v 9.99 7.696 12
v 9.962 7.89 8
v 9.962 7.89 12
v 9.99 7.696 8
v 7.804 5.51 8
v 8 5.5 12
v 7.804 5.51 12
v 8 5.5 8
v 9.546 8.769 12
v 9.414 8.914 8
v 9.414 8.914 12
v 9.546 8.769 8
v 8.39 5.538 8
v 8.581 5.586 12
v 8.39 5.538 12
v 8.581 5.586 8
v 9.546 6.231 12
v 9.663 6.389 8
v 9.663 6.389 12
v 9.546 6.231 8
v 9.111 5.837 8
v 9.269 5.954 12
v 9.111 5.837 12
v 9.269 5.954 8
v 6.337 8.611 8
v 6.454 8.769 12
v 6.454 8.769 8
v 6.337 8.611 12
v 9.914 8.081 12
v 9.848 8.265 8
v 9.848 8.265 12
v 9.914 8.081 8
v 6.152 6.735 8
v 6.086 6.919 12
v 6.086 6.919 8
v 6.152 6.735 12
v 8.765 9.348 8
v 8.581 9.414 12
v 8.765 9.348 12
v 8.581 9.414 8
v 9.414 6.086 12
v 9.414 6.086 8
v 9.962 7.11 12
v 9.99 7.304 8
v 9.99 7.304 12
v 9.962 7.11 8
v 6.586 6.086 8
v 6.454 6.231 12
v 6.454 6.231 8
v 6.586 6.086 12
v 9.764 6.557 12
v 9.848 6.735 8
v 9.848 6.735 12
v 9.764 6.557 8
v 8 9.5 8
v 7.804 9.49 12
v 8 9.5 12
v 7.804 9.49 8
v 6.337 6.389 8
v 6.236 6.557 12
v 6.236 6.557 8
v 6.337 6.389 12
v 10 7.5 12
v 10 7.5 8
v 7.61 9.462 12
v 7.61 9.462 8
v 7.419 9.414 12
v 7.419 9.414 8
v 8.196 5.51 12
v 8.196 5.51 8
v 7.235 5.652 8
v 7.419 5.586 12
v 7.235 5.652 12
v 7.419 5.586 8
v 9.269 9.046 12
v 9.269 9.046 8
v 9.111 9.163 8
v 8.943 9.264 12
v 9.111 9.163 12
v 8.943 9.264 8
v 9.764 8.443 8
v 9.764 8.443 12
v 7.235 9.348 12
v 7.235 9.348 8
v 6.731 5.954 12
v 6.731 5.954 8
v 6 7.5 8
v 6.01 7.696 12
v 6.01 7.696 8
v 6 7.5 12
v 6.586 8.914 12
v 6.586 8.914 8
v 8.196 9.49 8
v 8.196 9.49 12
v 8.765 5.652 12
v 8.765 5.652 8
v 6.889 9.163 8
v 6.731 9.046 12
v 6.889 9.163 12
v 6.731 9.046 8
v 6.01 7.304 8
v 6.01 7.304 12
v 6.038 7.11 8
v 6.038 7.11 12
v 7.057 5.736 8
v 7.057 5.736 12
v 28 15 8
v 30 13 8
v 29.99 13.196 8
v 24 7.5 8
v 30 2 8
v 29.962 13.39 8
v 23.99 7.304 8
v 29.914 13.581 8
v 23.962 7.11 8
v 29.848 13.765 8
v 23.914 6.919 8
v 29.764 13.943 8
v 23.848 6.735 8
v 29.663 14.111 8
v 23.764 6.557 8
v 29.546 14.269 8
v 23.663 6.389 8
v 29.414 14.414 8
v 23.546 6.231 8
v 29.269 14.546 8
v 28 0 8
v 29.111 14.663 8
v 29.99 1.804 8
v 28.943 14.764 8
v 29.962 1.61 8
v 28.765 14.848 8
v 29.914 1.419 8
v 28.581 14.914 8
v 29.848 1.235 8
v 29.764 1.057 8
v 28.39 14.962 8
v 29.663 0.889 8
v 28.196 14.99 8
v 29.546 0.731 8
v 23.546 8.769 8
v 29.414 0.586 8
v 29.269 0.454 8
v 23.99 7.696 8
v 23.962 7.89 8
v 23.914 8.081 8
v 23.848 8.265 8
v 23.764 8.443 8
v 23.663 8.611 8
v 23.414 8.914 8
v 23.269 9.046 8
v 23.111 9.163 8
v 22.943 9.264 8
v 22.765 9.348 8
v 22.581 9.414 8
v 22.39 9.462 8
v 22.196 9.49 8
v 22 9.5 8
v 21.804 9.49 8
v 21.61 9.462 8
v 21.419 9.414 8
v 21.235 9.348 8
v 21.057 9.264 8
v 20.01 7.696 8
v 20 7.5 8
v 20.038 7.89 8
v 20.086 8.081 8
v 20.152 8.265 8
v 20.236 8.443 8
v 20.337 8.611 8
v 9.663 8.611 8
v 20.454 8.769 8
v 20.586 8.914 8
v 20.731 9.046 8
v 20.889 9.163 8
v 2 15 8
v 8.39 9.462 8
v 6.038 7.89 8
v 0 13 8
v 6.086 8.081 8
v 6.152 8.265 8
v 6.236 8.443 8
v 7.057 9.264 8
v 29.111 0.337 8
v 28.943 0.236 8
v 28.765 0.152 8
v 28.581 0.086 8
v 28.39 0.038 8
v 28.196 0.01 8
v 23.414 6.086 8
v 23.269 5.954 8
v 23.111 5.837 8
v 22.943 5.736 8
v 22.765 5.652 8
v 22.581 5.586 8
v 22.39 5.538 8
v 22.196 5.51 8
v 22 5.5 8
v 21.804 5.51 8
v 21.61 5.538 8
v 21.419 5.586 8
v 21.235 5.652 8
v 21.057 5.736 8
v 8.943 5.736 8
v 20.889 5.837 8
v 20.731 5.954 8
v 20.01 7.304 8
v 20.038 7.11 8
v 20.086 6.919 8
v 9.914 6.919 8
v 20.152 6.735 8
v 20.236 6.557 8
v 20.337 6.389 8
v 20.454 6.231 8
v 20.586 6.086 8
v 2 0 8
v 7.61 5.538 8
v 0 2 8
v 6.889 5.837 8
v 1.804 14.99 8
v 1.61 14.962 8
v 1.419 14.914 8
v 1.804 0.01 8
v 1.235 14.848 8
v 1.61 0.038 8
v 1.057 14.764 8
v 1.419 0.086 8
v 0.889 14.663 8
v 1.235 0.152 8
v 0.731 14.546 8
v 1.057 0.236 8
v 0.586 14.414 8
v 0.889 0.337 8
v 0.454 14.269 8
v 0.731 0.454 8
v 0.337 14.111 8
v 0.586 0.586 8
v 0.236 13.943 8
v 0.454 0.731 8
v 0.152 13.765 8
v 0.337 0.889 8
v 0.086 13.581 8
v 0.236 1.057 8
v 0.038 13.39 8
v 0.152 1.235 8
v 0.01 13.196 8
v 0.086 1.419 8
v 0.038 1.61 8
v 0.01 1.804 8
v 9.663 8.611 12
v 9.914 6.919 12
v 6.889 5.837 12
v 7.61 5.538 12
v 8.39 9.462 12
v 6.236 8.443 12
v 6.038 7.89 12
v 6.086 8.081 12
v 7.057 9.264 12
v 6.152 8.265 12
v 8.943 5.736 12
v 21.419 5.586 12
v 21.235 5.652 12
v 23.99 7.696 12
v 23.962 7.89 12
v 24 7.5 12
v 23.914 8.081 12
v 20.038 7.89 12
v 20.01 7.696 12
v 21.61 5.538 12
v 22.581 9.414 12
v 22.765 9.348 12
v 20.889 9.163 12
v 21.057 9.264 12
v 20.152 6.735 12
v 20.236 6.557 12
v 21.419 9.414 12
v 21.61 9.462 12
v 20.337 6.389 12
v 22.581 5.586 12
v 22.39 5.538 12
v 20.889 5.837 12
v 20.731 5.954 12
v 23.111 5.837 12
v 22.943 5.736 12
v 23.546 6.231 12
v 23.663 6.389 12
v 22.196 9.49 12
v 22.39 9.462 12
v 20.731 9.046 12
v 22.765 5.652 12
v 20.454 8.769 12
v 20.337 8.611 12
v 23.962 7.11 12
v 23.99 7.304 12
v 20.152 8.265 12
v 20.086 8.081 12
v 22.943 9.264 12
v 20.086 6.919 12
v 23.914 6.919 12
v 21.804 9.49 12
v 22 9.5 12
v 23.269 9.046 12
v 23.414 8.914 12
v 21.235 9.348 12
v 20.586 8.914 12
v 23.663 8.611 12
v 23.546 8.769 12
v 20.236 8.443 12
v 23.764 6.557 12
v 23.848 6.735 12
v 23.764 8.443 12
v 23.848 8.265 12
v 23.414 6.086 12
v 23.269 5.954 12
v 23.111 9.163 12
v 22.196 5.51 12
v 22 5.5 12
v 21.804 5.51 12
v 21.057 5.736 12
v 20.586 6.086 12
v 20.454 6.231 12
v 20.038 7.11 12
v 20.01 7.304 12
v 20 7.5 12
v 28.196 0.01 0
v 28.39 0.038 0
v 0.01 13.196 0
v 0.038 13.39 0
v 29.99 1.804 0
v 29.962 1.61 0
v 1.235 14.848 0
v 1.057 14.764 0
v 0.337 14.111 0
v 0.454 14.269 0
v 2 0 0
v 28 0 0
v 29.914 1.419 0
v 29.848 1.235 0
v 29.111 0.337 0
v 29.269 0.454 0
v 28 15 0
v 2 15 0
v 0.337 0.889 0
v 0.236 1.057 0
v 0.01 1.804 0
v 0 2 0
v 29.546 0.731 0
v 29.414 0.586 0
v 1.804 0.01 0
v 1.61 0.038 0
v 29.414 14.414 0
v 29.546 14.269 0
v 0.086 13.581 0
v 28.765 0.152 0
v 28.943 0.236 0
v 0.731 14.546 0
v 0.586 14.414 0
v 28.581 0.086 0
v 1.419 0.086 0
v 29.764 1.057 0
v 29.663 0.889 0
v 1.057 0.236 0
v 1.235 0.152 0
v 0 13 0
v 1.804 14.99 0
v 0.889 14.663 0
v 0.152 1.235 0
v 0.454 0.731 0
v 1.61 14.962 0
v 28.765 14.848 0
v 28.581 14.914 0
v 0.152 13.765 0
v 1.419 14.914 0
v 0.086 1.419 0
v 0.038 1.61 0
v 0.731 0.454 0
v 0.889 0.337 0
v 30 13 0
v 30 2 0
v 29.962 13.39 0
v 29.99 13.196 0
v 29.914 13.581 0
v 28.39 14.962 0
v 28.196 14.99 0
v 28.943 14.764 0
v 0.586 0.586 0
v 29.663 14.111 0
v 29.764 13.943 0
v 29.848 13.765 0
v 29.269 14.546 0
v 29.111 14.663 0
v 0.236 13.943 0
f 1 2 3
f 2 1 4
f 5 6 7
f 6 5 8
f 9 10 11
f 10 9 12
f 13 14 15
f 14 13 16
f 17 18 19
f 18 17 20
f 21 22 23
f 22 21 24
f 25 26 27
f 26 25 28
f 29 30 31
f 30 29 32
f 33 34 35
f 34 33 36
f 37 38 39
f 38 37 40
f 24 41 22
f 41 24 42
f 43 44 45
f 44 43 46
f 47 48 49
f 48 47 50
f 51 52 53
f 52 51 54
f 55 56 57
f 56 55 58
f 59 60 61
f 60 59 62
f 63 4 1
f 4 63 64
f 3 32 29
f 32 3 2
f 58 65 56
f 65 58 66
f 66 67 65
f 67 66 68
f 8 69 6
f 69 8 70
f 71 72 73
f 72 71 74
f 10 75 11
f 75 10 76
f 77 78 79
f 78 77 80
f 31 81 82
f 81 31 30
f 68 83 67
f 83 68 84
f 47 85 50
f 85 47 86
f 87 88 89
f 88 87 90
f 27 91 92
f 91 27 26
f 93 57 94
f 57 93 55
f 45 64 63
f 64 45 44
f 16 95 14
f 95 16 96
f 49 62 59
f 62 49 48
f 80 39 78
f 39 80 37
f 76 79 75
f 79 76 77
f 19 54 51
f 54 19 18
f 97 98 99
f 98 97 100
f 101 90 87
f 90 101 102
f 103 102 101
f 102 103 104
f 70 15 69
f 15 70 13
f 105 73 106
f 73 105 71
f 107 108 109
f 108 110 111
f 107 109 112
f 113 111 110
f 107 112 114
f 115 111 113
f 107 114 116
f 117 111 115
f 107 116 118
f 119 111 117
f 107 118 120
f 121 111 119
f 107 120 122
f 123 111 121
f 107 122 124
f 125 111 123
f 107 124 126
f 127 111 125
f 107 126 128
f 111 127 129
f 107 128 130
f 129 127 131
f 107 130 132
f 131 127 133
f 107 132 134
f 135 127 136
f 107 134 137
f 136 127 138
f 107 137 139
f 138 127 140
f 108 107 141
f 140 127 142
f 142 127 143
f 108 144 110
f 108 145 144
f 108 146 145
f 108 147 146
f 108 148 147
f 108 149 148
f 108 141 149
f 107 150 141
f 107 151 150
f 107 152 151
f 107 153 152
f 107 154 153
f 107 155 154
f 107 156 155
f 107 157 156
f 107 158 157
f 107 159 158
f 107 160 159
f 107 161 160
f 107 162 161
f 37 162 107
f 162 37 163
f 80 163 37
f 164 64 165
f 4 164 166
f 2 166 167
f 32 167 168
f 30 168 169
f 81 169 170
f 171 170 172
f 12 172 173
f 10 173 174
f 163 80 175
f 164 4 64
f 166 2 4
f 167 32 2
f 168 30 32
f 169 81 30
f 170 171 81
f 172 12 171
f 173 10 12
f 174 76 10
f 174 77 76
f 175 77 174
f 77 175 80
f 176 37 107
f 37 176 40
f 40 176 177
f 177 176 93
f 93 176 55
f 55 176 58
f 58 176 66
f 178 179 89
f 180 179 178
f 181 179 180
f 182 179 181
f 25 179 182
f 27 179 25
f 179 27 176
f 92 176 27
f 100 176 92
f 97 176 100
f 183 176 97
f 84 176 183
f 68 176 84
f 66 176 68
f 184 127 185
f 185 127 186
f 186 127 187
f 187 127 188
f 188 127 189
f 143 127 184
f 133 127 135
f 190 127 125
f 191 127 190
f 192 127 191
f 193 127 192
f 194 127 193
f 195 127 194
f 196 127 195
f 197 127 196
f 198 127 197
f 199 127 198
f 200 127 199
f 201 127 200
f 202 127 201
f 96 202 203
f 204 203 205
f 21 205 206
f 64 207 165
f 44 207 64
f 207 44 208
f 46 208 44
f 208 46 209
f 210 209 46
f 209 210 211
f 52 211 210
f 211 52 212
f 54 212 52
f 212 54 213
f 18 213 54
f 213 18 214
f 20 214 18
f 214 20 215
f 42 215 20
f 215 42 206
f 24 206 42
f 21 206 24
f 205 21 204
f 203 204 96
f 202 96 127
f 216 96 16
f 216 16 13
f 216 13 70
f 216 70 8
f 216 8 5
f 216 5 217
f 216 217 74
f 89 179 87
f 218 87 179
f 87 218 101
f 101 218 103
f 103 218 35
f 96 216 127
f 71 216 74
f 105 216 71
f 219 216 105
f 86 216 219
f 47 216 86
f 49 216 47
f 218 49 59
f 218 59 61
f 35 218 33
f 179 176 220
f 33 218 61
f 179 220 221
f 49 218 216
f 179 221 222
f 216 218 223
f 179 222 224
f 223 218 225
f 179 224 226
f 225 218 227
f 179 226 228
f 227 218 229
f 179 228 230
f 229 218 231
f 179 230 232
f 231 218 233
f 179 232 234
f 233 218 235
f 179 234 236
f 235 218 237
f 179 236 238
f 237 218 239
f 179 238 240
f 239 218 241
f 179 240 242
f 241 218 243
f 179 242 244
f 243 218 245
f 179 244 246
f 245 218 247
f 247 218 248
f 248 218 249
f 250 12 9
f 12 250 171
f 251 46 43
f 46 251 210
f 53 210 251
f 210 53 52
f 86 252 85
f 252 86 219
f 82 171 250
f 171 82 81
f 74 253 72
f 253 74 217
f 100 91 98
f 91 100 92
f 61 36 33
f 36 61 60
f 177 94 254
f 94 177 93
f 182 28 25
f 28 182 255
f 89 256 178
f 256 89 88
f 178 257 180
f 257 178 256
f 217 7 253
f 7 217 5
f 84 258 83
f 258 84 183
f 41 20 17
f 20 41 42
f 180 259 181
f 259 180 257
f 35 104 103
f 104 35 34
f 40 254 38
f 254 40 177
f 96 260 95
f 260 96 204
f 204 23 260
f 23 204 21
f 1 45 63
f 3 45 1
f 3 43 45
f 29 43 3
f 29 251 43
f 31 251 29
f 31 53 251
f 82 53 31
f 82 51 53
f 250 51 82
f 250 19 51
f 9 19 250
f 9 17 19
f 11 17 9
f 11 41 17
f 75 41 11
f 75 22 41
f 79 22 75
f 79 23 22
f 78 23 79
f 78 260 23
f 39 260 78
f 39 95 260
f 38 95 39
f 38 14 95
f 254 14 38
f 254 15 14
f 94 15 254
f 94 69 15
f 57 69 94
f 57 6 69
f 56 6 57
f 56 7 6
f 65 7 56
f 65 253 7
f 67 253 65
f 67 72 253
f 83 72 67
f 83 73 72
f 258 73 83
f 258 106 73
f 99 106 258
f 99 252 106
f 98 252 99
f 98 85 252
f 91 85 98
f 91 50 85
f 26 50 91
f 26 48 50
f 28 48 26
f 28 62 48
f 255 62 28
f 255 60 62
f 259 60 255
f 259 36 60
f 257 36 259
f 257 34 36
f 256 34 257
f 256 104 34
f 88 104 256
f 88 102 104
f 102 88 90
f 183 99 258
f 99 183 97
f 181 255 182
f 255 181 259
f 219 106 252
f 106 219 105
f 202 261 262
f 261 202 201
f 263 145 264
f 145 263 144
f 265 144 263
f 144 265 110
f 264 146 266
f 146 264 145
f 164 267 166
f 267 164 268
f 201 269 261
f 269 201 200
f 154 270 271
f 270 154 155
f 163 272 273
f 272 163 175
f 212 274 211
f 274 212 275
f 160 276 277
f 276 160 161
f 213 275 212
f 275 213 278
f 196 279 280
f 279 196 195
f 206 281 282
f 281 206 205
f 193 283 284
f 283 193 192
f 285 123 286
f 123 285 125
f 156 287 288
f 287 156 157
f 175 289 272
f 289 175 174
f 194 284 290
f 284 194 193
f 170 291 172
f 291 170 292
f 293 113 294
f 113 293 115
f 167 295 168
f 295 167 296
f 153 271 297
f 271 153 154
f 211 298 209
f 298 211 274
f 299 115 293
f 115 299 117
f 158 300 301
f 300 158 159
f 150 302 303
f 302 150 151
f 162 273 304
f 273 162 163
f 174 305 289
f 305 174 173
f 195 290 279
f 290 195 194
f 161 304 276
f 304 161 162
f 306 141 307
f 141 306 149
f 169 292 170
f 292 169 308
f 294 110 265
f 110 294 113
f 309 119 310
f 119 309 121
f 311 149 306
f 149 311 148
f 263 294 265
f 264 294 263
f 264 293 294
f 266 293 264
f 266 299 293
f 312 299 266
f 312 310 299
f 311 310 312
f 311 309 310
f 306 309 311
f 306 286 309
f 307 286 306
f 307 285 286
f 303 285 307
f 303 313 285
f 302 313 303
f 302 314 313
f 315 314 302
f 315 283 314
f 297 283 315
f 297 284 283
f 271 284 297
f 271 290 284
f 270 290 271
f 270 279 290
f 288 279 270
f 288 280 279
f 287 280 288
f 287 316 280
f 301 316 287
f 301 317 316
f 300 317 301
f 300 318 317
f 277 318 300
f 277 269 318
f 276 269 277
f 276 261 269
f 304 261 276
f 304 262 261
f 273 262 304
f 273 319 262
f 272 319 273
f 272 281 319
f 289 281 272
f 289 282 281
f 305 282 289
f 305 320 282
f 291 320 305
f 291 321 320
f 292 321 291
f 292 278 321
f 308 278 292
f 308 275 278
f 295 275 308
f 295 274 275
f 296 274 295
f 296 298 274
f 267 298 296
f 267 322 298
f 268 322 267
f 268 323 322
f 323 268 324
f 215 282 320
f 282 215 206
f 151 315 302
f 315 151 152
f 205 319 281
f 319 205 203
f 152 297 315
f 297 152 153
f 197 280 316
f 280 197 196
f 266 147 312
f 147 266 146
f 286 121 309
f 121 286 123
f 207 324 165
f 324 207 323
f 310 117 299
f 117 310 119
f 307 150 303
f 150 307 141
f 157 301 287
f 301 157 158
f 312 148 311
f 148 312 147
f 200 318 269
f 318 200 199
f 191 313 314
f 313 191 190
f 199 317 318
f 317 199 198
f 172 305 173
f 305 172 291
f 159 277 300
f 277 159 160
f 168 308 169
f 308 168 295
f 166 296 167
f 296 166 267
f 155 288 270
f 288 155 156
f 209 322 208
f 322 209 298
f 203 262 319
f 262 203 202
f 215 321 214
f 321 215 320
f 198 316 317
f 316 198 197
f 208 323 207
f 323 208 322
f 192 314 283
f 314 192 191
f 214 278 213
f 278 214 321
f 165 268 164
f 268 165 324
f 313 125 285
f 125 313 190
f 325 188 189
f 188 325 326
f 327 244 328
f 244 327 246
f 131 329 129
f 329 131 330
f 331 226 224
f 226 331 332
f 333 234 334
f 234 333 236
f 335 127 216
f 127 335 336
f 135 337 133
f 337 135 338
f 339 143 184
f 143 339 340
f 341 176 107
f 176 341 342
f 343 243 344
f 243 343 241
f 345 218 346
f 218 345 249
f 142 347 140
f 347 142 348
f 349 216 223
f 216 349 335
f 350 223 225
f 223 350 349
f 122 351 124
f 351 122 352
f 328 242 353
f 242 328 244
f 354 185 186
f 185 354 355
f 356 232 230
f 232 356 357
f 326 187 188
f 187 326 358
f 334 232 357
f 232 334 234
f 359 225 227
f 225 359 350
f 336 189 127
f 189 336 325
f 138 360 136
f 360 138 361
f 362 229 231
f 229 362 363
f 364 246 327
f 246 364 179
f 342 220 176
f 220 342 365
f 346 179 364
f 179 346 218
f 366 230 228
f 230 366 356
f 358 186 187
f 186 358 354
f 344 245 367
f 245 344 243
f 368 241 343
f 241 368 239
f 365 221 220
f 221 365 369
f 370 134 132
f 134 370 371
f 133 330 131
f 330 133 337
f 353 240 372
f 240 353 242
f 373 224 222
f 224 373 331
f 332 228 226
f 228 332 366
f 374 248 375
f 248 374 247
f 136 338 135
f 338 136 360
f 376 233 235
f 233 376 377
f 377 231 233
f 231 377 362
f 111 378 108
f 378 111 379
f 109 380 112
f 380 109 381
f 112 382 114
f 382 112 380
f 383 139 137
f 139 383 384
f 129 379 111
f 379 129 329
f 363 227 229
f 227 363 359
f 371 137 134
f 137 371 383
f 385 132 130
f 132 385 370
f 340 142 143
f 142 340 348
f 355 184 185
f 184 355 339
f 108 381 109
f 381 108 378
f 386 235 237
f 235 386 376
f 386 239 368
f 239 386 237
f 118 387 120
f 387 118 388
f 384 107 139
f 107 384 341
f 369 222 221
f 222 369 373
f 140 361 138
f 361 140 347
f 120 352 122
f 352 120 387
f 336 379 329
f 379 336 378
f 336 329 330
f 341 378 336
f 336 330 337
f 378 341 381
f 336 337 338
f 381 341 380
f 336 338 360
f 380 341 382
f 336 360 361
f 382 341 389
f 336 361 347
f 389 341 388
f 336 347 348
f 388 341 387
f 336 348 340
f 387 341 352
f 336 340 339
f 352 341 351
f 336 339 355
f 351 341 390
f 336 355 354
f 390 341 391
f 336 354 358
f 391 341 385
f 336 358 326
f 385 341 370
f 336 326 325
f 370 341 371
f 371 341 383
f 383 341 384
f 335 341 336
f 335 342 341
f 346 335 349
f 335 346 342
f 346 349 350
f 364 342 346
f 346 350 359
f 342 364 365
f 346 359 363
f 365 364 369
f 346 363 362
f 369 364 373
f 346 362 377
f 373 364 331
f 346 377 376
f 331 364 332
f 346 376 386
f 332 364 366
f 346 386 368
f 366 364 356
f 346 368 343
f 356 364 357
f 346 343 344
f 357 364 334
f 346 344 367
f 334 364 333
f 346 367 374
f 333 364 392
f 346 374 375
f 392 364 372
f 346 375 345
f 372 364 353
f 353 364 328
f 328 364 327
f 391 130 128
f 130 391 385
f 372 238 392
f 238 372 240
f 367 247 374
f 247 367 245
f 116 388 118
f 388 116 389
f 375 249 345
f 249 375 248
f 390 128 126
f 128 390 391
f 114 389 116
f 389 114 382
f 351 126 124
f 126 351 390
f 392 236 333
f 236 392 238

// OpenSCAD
// file: params.scad
// Cat Feeder 5000 — Shared Parameters & Common Modules
// Include this file first in all part files: include <params.scad>

// ===== DIMENSIONS =====
WALL = 3;                // Standard wall thickness (mm)
THIN_WALL = 2.5;         // Thin walls (antenna arch, etc.)
FLOOR = 4;               // Base floor thickness
INSERT_BORE = 4.7;       // M3 heat-set insert pocket bore
M3_CLEAR = 3.4;          // M3 clearance hole
UNIT_W = 160;            // Main body width
UNIT_D = 240;            // Main body depth
UNIT_H = 160;            // Main body height
GATE_W = 118;            // Gate flap width
GATE_H = 90;             // Gate flap height
GATE_T = 3;              // Gate flap thickness
GATE_ROD_D = 3.2;        // Gate hinge rod diameter
ARCH_SPAN = 160;         // Antenna arch left-to-right span
ARCH_H = 70;             // Antenna arch height
ARCH_D = 40;             // Antenna arch depth (front-to-back)
COIL_CH_W = 16;          // Coil channel width
COIL_CH_D = 5;           // Coil channel depth
SERVO_W = 23;            // SG90 servo width
SERVO_D = 12.5;          // SG90 servo depth
SERVO_H = 30;            // SG90 servo height
SERVO_EAR_SPAN = 28;     // SG90 servo ear spacing
TOLERANCE = 0.1;         // General fit tolerance

// ===== RENDER QUALITY =====
$fn = 64;                // Circle resolution (smooth curves)

// ===== COLORS =====
COL_RFID = [0.8, 0.2, 0.2, 0.8];      // Red — RFID antenna arch
COL_TPU = [0.4, 0.7, 0.3, 0.8];       // Green — TPU flexible parts
COL_GATE = [0.2, 0.5, 0.8, 0.8];      // Blue — Gate mechanism
COL_BODY = [0.6, 0.6, 0.6, 0.8];      // Gray — Main body structure

// ===== COMMON MODULES =====

// M3 heat-set insert pocket (bore hole for pressed insert)
module m3_insert(h = 8) {
    cylinder(d = INSERT_BORE, h = h);
}

// M3 clearance hole (for bolt pass-through)
module m3_clear(h = 8) {
    cylinder(d = M3_CLEAR, h = h);
}

// Fillet box: rectangular box with filleted corners
// w, d, h = width, depth, height; r = corner radius
module fillet_box(w, d, h, r = 2) {
    hull() {
        translate([r, r, 0])
            cylinder(r = r, h = h);
        translate([w - r, r, 0])
            cylinder(r = r, h = h);
        translate([r, d - r, 0])
            cylinder(r = r, h = h);
        translate([w - r, d - r, 0])
            cylinder(r = r, h = h);
    }
}

// Boss: raised circular pad with M3 pocket
// Useful for internal reinforcement at bolt points
module boss(d = 10, h = 4, pocket = true) {
    difference() {
        cylinder(d = d, h = h);
        if (pocket)
            translate([0, 0, -0.1])
                m3_clear(h = h + 0.2);
    }
}
// main file
// Cat Feeder 5000 — Part 17: TPU Gate Bumper
// Soft end-stop for gate flap at fully-open position. Prevents servo overrun.
// Print: TPU 95A, 0.2mm layers, 30% infill. Print SLOW (25mm/s), no retraction.

include <params.scad>

color(COL_TPU) gate_bumper();

module gate_bumper() {
    BL = 30; BW = 15; BH = 8;
    PEG_D = 4; PEG_H = 4; // Press-fit peg into body wall

    union() {
        // Main bumper body
        fillet_box(BL, BW, BH, r=2);
        // Press-fit mounting pegs (×2)
        for (x = [8, BL - 8])
            translate([x, BW/2, BH])
                cylinder(d=PEG_D, h=PEG_H);
    }
}
